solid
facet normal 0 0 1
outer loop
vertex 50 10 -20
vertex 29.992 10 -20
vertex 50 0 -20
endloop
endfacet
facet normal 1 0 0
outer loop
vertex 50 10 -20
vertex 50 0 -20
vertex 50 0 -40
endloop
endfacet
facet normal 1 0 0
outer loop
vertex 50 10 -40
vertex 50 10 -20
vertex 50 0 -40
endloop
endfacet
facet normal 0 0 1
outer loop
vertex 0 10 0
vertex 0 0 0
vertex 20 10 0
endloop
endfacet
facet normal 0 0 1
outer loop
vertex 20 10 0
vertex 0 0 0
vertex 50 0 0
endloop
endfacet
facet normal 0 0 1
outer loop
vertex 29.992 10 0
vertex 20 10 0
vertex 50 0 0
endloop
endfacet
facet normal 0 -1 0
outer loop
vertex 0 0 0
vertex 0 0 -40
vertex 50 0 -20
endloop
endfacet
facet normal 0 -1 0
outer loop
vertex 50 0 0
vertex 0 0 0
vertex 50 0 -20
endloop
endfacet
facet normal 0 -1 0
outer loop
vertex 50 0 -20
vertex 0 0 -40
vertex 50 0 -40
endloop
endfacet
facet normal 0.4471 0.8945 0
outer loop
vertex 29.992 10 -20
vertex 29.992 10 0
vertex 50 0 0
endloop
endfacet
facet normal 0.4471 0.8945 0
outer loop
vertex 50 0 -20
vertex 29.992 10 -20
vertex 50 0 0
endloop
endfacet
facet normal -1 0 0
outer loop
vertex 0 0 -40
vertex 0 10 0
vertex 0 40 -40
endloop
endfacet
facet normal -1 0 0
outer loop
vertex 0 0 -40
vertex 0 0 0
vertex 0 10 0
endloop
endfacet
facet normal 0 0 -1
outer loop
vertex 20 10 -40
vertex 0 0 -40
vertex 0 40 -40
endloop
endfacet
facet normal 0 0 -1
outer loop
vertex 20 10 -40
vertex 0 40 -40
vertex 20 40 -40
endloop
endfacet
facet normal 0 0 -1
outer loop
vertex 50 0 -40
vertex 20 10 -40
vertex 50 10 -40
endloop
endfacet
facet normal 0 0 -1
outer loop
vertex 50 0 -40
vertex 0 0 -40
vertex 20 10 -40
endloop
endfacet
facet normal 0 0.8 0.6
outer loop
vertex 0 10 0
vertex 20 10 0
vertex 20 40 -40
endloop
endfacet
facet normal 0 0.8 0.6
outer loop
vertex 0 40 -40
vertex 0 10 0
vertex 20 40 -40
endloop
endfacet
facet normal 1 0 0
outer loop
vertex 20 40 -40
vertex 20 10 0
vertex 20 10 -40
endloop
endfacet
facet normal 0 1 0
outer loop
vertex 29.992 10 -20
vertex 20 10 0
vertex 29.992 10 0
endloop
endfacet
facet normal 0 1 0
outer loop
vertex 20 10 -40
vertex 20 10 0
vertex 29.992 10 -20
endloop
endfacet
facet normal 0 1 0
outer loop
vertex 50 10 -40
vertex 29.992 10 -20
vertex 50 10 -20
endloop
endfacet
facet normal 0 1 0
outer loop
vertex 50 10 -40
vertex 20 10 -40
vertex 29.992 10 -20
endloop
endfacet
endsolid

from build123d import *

# Parameters (mm, degrees)
SKETCH16_W          = 50
SKETCH16_H          = 40
BOSS_EXTRUDE3_DEPTH = 10
CUT_EXTRUDE10_DEPTH = 20
SKETCH21_W          = 20.000334642
SKETCH21_H          = 40
BOSS_EXTRUDE4_DEPTH = 30
CUT_EXTRUDE12_DEPTH = 21


with BuildPart() as part:
    # Sketch16 → Boss-Extrude3 (new body)
    with BuildSketch(Plane(origin=(0, 0, 0), x_dir=(1, 0, 0), z_dir=(0, 1, 0))):
        with Locations((25, 20)):
            Rectangle(SKETCH16_W, SKETCH16_H)
    extrude(amount=BOSS_EXTRUDE3_DEPTH)

    # Sketch20 → Cut-Extrude10 (cut)
    with BuildSketch(Plane.XY):
        Polygon((50, 10), (29.992004992, 10), (50, 0), align=None)
    extrude(amount=-CUT_EXTRUDE10_DEPTH, mode=Mode.SUBTRACT)

    # Sketch21 → Boss-Extrude4 (add)
    with BuildSketch(Plane(origin=(0, 10, 0), x_dir=(1, 0, 0), z_dir=(0, 1, 0))):
        with Locations((10.000167321, 20)):
            Rectangle(SKETCH21_W, SKETCH21_H)
    extrude(amount=BOSS_EXTRUDE4_DEPTH)

    # Sketch22 → Cut-Extrude12 (cut)
    with BuildSketch(Plane(origin=(20.000334642, 0, 0), x_dir=(0, 0, -1), z_dir=(1, 0, 0))):
        Polygon((40, 40), (0, 40), (0, 10), align=None)
    extrude(amount=-CUT_EXTRUDE12_DEPTH, mode=Mode.SUBTRACT)


solid = part.part
